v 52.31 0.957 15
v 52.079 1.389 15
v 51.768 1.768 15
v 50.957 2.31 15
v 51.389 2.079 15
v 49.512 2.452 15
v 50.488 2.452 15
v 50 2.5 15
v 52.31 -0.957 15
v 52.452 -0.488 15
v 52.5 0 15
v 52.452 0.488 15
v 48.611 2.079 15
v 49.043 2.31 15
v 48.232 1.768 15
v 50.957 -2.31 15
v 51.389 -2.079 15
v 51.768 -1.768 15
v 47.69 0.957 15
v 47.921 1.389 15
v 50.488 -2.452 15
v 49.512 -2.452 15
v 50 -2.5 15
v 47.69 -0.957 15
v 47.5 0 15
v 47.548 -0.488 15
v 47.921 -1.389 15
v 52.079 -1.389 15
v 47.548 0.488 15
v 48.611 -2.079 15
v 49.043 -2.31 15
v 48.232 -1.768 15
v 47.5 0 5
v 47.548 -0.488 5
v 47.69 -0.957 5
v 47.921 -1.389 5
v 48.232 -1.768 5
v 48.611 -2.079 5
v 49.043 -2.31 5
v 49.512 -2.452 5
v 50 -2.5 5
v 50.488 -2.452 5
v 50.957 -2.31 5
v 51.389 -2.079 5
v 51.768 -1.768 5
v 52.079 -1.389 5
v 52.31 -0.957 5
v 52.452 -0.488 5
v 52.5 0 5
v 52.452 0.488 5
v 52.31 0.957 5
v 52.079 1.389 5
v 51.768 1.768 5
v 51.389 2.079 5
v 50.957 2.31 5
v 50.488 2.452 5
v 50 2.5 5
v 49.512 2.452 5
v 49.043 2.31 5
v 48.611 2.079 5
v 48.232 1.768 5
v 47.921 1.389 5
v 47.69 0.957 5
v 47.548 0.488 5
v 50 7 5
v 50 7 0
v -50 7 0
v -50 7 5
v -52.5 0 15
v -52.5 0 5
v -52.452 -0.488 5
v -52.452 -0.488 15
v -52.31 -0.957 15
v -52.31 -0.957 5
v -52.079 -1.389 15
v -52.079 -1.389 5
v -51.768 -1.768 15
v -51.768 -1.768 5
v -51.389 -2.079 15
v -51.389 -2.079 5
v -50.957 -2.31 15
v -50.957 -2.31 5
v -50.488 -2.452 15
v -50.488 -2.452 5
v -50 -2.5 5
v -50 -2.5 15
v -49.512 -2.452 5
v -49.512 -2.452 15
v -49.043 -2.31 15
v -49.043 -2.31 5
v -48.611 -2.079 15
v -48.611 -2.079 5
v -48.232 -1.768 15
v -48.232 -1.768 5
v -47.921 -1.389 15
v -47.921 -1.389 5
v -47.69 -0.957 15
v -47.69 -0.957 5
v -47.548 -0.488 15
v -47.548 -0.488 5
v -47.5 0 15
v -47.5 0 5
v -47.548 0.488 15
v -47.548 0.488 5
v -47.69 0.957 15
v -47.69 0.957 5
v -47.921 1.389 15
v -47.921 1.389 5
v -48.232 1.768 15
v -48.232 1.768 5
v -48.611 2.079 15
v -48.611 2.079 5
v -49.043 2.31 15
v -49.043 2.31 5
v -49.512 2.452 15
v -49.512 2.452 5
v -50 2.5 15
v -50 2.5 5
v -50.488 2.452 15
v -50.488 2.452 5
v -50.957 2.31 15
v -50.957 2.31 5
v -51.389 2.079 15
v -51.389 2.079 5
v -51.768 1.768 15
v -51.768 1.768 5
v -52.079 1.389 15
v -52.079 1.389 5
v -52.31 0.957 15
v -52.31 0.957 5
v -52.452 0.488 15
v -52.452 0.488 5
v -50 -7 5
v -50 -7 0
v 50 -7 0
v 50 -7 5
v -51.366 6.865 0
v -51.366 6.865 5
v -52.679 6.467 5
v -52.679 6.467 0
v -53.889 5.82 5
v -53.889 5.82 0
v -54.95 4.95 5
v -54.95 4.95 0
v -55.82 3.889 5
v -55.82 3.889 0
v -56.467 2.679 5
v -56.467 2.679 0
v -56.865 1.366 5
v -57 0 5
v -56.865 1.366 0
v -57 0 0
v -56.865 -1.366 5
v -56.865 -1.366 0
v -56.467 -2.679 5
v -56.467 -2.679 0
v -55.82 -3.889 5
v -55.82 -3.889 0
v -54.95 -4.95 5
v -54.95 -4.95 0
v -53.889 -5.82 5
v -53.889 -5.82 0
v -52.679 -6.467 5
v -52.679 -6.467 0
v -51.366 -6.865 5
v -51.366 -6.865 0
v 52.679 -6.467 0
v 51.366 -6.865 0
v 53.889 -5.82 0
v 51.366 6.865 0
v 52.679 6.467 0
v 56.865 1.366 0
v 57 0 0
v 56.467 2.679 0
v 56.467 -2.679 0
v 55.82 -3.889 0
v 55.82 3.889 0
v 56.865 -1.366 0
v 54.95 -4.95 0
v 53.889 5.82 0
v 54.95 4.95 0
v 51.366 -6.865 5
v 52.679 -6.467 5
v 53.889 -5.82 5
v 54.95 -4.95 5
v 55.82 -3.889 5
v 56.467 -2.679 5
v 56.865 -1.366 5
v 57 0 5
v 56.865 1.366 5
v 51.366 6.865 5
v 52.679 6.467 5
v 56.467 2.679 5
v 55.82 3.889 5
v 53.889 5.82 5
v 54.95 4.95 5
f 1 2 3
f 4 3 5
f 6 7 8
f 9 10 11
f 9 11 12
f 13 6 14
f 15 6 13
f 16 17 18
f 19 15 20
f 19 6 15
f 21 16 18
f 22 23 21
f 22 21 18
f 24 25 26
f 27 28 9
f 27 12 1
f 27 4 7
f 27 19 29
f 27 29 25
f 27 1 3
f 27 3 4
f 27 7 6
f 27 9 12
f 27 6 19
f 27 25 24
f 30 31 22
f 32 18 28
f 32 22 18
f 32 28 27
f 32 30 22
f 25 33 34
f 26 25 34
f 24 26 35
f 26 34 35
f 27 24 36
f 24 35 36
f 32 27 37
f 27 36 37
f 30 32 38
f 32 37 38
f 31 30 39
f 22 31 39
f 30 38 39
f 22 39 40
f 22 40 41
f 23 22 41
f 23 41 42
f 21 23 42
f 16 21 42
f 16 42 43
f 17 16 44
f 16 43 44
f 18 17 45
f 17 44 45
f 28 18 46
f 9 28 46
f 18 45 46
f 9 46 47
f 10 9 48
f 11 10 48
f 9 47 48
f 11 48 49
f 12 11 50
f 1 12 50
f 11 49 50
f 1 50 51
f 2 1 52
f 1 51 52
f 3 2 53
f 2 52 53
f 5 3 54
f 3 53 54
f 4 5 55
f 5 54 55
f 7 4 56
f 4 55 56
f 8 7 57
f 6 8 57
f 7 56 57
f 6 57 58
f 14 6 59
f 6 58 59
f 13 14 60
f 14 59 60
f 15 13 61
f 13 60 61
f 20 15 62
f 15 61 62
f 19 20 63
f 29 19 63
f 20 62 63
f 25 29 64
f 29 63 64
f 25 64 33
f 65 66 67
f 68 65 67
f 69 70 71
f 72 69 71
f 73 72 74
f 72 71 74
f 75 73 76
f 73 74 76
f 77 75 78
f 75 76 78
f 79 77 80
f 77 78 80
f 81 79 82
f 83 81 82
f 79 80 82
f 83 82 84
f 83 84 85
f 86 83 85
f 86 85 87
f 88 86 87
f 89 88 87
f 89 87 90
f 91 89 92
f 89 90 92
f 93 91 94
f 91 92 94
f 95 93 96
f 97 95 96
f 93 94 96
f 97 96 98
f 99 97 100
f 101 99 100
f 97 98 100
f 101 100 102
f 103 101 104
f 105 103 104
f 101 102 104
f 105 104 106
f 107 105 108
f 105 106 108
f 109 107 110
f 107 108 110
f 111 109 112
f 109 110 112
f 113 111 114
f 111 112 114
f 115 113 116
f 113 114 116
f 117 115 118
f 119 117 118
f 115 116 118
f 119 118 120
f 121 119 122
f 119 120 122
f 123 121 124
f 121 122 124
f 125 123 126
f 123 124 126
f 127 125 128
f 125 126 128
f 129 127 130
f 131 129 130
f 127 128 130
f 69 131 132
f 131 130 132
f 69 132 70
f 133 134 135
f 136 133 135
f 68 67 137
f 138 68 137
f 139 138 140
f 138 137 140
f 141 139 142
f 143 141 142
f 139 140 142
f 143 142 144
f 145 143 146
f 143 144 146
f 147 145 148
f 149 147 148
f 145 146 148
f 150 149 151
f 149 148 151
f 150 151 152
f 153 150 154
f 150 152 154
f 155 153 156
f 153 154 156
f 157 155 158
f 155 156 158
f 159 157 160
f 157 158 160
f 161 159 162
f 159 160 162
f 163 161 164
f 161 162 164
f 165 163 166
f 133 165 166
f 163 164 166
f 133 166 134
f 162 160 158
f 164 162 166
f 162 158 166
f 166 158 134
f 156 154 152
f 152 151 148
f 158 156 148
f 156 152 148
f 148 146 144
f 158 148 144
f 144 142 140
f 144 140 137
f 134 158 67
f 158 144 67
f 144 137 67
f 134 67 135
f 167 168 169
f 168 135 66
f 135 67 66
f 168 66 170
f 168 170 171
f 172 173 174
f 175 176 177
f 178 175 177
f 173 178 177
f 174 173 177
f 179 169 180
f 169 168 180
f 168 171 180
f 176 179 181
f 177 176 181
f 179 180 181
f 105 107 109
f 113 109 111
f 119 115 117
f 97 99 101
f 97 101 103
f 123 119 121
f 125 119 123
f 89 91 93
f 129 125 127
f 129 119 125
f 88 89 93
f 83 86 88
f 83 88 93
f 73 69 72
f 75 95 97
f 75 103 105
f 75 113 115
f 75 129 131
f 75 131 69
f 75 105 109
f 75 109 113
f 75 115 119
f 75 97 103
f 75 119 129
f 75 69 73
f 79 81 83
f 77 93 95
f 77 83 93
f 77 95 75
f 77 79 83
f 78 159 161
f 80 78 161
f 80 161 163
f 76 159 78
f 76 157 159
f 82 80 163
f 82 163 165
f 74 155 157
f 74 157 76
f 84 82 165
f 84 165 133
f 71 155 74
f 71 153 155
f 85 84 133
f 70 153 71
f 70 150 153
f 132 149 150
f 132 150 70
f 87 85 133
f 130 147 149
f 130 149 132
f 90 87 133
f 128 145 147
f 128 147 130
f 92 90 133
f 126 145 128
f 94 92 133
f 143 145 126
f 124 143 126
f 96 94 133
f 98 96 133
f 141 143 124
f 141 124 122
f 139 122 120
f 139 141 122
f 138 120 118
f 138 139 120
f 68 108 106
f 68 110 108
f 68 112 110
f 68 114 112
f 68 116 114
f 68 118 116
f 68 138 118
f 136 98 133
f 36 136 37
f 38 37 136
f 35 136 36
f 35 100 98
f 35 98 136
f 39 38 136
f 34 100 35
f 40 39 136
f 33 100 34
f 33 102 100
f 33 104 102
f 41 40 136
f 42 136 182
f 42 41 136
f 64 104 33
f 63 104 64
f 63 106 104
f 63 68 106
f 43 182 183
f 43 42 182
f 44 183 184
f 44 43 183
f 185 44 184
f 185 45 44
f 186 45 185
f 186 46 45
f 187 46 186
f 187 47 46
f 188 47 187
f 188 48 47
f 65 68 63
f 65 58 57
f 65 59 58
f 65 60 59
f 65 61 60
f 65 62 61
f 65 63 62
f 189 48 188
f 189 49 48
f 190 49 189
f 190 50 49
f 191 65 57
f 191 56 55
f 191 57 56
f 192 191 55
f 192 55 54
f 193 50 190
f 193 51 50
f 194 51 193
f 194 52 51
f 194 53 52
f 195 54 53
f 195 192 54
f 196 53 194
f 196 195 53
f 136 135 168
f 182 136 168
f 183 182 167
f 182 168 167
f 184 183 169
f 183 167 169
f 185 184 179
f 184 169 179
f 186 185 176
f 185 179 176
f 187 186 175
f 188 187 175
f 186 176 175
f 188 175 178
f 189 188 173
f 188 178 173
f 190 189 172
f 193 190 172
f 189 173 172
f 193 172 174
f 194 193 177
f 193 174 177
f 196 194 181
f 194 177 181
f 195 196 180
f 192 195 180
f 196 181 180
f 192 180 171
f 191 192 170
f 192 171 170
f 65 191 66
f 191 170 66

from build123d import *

# Parameters (mm, degrees)
BOSS_EXTRUDE1_DEPTH = 5
SKETCH2_R           = 2.5
BOSS_EXTRUDE2_DEPTH = 10


with BuildPart() as part:
    # Sketch1 → Boss-Extrude1 (new body)
    with BuildSketch(Plane.XY):
        with BuildLine():
            Line((-50.000002608, -7.000000122), (50.000000869, -7.000000122))
            ThreePointArc((50.000000869, -7.000000122), (57.000000869, -1.22e-07), (50.000000869, 6.999999878))
            Line((50.000000869, 6.999999878), (-49.999999131, 6.999999878))
            ThreePointArc((-49.999999131, 6.999999878), (-57.000000869, 1.617e-06), (-50.000002608, -7.000000122))
        make_face()
    extrude(amount=BOSS_EXTRUDE1_DEPTH)

    # Sketch2 → Boss-Extrude2 (add)
    with BuildSketch(Plane.XY.offset(5)):
        with Locations(Location((-50.000000869, -1.22e-07, 0), (0, 0, 180))):
            Circle(SKETCH2_R)
        with Locations(Location((50.000000869, -1.22e-07, 0), (0, 0, 180))):
            Circle(SKETCH2_R)
    extrude(amount=BOSS_EXTRUDE2_DEPTH)


solid = part.part
